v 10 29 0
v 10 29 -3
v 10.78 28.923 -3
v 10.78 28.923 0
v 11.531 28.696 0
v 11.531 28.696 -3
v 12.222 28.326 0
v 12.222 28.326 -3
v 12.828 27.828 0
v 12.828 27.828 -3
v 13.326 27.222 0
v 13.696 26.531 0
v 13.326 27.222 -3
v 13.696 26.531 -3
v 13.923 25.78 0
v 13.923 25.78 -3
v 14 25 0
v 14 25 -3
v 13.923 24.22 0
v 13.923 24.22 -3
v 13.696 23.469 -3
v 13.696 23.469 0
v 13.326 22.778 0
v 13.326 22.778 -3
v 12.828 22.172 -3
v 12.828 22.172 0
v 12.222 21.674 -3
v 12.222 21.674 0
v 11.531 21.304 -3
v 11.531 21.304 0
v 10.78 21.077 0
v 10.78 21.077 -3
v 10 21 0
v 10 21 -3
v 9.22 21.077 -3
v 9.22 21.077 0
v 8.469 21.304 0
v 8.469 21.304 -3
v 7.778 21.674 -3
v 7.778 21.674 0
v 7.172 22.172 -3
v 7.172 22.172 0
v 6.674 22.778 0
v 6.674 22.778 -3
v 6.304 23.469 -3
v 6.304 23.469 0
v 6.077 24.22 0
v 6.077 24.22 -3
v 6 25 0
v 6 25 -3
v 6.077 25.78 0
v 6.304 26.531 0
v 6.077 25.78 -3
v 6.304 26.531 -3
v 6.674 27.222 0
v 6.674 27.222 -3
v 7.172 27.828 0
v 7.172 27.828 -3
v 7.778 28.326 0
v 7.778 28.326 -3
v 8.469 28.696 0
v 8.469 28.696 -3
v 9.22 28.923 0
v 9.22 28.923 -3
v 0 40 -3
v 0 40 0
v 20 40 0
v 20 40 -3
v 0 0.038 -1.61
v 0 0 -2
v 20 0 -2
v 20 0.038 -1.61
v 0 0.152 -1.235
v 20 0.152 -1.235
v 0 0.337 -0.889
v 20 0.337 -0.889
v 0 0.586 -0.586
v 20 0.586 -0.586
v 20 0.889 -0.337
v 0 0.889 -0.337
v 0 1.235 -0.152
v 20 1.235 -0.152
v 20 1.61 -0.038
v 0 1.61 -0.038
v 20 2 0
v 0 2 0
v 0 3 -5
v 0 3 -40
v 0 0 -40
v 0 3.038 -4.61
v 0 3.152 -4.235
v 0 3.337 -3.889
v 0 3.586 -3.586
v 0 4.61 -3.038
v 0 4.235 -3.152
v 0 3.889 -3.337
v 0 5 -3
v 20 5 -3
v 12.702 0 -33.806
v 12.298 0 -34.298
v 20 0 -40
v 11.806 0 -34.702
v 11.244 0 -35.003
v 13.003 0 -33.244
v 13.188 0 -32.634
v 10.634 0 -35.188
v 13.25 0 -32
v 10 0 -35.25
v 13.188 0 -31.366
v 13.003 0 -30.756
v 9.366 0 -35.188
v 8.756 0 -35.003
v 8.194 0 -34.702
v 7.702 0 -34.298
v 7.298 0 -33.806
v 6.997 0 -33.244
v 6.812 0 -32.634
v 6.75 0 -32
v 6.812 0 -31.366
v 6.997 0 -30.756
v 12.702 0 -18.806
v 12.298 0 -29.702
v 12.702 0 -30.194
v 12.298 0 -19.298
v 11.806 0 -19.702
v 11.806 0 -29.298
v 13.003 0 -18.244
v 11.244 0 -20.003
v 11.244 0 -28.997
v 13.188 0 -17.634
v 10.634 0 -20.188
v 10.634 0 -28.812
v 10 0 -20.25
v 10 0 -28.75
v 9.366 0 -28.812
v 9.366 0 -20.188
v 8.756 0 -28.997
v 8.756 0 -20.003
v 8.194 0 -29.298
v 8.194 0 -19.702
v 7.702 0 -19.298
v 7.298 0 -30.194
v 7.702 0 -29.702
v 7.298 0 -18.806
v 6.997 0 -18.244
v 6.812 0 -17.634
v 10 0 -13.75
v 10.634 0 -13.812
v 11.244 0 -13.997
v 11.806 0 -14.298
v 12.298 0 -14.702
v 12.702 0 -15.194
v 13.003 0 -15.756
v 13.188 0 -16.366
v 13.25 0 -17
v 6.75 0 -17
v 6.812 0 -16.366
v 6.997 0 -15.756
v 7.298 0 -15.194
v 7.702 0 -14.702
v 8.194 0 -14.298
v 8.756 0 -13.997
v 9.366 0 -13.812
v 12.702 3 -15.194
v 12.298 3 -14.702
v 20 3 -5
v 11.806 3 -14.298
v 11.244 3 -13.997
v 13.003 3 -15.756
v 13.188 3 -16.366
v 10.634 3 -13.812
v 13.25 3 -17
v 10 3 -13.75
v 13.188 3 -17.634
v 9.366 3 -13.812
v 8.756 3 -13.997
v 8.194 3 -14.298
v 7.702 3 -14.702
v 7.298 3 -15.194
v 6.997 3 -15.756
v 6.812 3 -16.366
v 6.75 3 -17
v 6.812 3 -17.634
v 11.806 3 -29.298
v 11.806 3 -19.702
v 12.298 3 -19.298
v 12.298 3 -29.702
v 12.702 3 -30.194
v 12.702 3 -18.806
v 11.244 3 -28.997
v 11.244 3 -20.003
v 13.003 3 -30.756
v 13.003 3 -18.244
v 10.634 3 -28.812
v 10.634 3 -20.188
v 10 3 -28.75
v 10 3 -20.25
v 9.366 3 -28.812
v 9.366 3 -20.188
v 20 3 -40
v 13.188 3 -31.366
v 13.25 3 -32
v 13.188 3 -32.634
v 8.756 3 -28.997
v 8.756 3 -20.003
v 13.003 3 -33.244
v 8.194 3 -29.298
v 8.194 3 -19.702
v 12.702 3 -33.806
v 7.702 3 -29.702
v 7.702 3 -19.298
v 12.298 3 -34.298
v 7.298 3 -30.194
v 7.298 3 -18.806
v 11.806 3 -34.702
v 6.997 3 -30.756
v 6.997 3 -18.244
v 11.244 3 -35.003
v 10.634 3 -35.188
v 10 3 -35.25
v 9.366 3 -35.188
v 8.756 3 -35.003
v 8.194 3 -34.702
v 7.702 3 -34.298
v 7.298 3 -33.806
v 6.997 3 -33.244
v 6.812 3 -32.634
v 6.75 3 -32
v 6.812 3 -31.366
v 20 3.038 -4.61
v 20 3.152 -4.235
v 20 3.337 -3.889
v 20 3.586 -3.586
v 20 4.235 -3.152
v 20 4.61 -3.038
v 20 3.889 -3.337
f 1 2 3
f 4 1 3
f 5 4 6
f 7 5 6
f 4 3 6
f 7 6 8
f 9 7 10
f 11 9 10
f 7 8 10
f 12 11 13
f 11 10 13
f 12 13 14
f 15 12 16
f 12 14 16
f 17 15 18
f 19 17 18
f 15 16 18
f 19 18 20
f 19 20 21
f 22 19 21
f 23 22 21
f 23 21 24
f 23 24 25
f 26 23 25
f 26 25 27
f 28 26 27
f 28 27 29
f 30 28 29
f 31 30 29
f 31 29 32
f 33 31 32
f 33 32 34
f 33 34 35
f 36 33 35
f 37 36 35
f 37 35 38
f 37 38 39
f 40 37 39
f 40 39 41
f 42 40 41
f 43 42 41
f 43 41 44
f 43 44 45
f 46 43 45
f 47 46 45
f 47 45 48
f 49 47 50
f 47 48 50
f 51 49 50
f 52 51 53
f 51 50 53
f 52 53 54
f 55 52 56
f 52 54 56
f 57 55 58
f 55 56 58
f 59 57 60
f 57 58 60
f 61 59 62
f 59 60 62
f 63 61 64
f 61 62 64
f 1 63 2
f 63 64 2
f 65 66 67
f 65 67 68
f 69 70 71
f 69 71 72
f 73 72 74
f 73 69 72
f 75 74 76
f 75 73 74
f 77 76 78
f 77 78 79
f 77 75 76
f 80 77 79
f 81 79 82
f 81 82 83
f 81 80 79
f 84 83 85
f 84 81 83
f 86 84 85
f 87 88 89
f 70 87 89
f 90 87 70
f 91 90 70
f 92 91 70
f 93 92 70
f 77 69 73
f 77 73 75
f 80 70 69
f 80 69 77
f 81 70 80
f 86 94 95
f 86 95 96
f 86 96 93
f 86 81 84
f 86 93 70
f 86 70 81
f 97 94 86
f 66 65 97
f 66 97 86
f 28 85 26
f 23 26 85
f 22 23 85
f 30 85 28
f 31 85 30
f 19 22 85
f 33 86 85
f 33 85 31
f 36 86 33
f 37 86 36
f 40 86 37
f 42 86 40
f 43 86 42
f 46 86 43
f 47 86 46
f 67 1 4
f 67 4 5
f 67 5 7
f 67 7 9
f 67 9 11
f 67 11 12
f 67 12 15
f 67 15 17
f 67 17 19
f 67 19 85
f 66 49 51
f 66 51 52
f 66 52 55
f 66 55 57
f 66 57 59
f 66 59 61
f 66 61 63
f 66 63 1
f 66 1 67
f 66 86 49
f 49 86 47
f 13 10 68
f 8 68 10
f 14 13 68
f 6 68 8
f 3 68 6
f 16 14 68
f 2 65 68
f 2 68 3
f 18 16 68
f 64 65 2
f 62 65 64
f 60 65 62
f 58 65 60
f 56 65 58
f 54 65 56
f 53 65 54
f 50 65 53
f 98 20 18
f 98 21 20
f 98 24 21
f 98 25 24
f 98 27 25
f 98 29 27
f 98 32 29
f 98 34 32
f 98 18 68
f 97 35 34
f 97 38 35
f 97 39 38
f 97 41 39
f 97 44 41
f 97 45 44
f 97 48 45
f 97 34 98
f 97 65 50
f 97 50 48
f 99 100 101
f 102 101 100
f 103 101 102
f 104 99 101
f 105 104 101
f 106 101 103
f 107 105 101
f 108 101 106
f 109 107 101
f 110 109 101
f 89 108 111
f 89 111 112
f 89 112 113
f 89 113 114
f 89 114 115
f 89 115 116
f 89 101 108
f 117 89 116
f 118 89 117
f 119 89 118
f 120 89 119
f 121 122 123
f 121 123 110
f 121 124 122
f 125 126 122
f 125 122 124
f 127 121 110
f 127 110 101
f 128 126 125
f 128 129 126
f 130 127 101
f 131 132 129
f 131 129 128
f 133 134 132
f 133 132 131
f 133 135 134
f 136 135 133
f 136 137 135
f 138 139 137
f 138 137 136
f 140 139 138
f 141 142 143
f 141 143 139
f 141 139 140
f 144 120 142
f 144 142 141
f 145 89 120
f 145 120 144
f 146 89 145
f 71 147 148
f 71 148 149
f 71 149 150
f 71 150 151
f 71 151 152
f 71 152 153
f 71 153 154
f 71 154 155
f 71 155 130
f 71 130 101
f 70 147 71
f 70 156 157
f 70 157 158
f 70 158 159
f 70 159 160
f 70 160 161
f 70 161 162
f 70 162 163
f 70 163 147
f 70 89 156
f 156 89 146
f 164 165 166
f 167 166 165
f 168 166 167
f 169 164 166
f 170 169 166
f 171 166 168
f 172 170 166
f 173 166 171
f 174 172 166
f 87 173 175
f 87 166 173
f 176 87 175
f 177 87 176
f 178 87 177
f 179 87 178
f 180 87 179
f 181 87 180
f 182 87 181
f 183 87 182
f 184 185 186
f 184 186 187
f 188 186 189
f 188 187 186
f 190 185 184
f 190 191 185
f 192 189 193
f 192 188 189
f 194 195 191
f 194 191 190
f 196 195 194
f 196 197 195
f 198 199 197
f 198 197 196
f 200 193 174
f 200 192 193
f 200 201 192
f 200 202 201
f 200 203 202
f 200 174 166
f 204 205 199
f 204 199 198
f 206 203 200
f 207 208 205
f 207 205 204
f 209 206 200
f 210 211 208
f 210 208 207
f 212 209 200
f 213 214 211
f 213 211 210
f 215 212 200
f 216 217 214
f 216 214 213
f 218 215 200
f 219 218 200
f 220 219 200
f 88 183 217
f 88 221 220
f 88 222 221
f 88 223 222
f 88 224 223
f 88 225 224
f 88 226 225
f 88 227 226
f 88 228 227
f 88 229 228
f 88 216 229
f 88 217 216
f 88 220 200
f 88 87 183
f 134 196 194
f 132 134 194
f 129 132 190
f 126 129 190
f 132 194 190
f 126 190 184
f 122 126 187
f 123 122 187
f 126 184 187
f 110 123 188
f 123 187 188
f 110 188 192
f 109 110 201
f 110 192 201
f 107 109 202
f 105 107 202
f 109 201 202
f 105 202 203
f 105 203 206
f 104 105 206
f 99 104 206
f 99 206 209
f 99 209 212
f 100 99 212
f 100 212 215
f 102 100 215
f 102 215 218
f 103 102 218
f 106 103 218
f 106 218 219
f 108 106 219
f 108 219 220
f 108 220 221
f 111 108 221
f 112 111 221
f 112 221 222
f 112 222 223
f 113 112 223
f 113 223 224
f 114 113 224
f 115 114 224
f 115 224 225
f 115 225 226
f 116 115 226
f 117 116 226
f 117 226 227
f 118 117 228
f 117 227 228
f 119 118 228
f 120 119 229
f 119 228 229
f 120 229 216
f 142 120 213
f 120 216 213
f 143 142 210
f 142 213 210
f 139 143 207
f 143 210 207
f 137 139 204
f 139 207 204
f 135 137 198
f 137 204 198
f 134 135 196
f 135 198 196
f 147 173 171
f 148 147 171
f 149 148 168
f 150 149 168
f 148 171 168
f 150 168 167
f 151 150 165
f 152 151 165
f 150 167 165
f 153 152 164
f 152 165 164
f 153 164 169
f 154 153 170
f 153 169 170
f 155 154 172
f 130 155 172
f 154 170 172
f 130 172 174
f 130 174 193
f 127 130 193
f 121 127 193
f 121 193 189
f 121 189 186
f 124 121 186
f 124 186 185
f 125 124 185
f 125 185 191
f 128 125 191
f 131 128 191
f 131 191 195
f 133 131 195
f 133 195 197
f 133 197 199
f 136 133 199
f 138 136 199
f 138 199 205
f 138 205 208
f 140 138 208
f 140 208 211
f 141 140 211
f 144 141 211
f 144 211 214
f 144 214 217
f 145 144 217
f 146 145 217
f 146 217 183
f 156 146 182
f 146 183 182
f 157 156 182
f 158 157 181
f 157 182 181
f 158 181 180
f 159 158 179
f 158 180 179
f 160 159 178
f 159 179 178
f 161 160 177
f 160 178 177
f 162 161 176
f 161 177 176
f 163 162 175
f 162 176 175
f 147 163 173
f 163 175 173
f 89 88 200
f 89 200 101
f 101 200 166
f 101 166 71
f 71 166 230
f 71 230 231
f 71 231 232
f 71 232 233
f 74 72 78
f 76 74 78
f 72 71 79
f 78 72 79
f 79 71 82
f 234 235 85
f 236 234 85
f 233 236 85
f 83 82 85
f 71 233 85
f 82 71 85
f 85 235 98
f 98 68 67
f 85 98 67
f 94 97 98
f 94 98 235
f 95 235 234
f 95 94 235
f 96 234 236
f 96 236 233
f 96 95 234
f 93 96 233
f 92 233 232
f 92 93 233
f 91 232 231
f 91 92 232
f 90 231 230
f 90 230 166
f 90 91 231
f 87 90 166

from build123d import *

# Parameters (mm, degrees)
BOSS_EXTRUDE1_DEPTH = 20
SKETCH3_R           = 4
CUT_EXTRUDE1_DEPTH  = 59.043087444
SKETCH4_R           = 3.25
CUT_EXTRUDE2_DEPTH  = 59.043087444


with BuildPart() as part:
    # Sketch1 → Boss-Extrude1 (new body)
    with BuildSketch(Plane(origin=(0, 0, 0), x_dir=(0, 0, -1), z_dir=(1, 0, 0))):
        with BuildLine():
            Line((0, 2), (0, 40))
            Line((0, 40), (3, 40))
            Line((3, 40), (3, 5))
            ThreePointArc((3, 5), (3.585786438, 3.585786438), (5, 3))
            Line((5, 3), (40, 3))
            Line((40, 3), (40, 0))
            Line((40, 0), (2, 0))
            ThreePointArc((2, 0), (0.585786438, 0.585786438), (0, 2))
        make_face()
    extrude(amount=BOSS_EXTRUDE1_DEPTH)

    # Sketch3 → Cut-Extrude1 (cut, through all)
    with BuildSketch(Plane(origin=(0, 0, -3), x_dir=(-1, 0, 0), z_dir=(0, 0, -1))):
        with Locations(Location((-10, 25, 0), (0, 0, 90))):
            Circle(SKETCH3_R)
    extrude(amount=-CUT_EXTRUDE1_DEPTH, mode=Mode.SUBTRACT)

    # Sketch4 → Cut-Extrude2 (cut, through all)
    with BuildSketch(Plane(origin=(0, 3, 0), x_dir=(1, 0, 0), z_dir=(0, 1, 0))):
        with Locations(Location((10, 32, 0), (0, 0, 270))):
            Circle(SKETCH4_R)
        with Locations(Location((10, 17, 0), (0, 0, 270))):
            Circle(SKETCH4_R)
    extrude(amount=-CUT_EXTRUDE2_DEPTH, mode=Mode.SUBTRACT)


solid = part.part
